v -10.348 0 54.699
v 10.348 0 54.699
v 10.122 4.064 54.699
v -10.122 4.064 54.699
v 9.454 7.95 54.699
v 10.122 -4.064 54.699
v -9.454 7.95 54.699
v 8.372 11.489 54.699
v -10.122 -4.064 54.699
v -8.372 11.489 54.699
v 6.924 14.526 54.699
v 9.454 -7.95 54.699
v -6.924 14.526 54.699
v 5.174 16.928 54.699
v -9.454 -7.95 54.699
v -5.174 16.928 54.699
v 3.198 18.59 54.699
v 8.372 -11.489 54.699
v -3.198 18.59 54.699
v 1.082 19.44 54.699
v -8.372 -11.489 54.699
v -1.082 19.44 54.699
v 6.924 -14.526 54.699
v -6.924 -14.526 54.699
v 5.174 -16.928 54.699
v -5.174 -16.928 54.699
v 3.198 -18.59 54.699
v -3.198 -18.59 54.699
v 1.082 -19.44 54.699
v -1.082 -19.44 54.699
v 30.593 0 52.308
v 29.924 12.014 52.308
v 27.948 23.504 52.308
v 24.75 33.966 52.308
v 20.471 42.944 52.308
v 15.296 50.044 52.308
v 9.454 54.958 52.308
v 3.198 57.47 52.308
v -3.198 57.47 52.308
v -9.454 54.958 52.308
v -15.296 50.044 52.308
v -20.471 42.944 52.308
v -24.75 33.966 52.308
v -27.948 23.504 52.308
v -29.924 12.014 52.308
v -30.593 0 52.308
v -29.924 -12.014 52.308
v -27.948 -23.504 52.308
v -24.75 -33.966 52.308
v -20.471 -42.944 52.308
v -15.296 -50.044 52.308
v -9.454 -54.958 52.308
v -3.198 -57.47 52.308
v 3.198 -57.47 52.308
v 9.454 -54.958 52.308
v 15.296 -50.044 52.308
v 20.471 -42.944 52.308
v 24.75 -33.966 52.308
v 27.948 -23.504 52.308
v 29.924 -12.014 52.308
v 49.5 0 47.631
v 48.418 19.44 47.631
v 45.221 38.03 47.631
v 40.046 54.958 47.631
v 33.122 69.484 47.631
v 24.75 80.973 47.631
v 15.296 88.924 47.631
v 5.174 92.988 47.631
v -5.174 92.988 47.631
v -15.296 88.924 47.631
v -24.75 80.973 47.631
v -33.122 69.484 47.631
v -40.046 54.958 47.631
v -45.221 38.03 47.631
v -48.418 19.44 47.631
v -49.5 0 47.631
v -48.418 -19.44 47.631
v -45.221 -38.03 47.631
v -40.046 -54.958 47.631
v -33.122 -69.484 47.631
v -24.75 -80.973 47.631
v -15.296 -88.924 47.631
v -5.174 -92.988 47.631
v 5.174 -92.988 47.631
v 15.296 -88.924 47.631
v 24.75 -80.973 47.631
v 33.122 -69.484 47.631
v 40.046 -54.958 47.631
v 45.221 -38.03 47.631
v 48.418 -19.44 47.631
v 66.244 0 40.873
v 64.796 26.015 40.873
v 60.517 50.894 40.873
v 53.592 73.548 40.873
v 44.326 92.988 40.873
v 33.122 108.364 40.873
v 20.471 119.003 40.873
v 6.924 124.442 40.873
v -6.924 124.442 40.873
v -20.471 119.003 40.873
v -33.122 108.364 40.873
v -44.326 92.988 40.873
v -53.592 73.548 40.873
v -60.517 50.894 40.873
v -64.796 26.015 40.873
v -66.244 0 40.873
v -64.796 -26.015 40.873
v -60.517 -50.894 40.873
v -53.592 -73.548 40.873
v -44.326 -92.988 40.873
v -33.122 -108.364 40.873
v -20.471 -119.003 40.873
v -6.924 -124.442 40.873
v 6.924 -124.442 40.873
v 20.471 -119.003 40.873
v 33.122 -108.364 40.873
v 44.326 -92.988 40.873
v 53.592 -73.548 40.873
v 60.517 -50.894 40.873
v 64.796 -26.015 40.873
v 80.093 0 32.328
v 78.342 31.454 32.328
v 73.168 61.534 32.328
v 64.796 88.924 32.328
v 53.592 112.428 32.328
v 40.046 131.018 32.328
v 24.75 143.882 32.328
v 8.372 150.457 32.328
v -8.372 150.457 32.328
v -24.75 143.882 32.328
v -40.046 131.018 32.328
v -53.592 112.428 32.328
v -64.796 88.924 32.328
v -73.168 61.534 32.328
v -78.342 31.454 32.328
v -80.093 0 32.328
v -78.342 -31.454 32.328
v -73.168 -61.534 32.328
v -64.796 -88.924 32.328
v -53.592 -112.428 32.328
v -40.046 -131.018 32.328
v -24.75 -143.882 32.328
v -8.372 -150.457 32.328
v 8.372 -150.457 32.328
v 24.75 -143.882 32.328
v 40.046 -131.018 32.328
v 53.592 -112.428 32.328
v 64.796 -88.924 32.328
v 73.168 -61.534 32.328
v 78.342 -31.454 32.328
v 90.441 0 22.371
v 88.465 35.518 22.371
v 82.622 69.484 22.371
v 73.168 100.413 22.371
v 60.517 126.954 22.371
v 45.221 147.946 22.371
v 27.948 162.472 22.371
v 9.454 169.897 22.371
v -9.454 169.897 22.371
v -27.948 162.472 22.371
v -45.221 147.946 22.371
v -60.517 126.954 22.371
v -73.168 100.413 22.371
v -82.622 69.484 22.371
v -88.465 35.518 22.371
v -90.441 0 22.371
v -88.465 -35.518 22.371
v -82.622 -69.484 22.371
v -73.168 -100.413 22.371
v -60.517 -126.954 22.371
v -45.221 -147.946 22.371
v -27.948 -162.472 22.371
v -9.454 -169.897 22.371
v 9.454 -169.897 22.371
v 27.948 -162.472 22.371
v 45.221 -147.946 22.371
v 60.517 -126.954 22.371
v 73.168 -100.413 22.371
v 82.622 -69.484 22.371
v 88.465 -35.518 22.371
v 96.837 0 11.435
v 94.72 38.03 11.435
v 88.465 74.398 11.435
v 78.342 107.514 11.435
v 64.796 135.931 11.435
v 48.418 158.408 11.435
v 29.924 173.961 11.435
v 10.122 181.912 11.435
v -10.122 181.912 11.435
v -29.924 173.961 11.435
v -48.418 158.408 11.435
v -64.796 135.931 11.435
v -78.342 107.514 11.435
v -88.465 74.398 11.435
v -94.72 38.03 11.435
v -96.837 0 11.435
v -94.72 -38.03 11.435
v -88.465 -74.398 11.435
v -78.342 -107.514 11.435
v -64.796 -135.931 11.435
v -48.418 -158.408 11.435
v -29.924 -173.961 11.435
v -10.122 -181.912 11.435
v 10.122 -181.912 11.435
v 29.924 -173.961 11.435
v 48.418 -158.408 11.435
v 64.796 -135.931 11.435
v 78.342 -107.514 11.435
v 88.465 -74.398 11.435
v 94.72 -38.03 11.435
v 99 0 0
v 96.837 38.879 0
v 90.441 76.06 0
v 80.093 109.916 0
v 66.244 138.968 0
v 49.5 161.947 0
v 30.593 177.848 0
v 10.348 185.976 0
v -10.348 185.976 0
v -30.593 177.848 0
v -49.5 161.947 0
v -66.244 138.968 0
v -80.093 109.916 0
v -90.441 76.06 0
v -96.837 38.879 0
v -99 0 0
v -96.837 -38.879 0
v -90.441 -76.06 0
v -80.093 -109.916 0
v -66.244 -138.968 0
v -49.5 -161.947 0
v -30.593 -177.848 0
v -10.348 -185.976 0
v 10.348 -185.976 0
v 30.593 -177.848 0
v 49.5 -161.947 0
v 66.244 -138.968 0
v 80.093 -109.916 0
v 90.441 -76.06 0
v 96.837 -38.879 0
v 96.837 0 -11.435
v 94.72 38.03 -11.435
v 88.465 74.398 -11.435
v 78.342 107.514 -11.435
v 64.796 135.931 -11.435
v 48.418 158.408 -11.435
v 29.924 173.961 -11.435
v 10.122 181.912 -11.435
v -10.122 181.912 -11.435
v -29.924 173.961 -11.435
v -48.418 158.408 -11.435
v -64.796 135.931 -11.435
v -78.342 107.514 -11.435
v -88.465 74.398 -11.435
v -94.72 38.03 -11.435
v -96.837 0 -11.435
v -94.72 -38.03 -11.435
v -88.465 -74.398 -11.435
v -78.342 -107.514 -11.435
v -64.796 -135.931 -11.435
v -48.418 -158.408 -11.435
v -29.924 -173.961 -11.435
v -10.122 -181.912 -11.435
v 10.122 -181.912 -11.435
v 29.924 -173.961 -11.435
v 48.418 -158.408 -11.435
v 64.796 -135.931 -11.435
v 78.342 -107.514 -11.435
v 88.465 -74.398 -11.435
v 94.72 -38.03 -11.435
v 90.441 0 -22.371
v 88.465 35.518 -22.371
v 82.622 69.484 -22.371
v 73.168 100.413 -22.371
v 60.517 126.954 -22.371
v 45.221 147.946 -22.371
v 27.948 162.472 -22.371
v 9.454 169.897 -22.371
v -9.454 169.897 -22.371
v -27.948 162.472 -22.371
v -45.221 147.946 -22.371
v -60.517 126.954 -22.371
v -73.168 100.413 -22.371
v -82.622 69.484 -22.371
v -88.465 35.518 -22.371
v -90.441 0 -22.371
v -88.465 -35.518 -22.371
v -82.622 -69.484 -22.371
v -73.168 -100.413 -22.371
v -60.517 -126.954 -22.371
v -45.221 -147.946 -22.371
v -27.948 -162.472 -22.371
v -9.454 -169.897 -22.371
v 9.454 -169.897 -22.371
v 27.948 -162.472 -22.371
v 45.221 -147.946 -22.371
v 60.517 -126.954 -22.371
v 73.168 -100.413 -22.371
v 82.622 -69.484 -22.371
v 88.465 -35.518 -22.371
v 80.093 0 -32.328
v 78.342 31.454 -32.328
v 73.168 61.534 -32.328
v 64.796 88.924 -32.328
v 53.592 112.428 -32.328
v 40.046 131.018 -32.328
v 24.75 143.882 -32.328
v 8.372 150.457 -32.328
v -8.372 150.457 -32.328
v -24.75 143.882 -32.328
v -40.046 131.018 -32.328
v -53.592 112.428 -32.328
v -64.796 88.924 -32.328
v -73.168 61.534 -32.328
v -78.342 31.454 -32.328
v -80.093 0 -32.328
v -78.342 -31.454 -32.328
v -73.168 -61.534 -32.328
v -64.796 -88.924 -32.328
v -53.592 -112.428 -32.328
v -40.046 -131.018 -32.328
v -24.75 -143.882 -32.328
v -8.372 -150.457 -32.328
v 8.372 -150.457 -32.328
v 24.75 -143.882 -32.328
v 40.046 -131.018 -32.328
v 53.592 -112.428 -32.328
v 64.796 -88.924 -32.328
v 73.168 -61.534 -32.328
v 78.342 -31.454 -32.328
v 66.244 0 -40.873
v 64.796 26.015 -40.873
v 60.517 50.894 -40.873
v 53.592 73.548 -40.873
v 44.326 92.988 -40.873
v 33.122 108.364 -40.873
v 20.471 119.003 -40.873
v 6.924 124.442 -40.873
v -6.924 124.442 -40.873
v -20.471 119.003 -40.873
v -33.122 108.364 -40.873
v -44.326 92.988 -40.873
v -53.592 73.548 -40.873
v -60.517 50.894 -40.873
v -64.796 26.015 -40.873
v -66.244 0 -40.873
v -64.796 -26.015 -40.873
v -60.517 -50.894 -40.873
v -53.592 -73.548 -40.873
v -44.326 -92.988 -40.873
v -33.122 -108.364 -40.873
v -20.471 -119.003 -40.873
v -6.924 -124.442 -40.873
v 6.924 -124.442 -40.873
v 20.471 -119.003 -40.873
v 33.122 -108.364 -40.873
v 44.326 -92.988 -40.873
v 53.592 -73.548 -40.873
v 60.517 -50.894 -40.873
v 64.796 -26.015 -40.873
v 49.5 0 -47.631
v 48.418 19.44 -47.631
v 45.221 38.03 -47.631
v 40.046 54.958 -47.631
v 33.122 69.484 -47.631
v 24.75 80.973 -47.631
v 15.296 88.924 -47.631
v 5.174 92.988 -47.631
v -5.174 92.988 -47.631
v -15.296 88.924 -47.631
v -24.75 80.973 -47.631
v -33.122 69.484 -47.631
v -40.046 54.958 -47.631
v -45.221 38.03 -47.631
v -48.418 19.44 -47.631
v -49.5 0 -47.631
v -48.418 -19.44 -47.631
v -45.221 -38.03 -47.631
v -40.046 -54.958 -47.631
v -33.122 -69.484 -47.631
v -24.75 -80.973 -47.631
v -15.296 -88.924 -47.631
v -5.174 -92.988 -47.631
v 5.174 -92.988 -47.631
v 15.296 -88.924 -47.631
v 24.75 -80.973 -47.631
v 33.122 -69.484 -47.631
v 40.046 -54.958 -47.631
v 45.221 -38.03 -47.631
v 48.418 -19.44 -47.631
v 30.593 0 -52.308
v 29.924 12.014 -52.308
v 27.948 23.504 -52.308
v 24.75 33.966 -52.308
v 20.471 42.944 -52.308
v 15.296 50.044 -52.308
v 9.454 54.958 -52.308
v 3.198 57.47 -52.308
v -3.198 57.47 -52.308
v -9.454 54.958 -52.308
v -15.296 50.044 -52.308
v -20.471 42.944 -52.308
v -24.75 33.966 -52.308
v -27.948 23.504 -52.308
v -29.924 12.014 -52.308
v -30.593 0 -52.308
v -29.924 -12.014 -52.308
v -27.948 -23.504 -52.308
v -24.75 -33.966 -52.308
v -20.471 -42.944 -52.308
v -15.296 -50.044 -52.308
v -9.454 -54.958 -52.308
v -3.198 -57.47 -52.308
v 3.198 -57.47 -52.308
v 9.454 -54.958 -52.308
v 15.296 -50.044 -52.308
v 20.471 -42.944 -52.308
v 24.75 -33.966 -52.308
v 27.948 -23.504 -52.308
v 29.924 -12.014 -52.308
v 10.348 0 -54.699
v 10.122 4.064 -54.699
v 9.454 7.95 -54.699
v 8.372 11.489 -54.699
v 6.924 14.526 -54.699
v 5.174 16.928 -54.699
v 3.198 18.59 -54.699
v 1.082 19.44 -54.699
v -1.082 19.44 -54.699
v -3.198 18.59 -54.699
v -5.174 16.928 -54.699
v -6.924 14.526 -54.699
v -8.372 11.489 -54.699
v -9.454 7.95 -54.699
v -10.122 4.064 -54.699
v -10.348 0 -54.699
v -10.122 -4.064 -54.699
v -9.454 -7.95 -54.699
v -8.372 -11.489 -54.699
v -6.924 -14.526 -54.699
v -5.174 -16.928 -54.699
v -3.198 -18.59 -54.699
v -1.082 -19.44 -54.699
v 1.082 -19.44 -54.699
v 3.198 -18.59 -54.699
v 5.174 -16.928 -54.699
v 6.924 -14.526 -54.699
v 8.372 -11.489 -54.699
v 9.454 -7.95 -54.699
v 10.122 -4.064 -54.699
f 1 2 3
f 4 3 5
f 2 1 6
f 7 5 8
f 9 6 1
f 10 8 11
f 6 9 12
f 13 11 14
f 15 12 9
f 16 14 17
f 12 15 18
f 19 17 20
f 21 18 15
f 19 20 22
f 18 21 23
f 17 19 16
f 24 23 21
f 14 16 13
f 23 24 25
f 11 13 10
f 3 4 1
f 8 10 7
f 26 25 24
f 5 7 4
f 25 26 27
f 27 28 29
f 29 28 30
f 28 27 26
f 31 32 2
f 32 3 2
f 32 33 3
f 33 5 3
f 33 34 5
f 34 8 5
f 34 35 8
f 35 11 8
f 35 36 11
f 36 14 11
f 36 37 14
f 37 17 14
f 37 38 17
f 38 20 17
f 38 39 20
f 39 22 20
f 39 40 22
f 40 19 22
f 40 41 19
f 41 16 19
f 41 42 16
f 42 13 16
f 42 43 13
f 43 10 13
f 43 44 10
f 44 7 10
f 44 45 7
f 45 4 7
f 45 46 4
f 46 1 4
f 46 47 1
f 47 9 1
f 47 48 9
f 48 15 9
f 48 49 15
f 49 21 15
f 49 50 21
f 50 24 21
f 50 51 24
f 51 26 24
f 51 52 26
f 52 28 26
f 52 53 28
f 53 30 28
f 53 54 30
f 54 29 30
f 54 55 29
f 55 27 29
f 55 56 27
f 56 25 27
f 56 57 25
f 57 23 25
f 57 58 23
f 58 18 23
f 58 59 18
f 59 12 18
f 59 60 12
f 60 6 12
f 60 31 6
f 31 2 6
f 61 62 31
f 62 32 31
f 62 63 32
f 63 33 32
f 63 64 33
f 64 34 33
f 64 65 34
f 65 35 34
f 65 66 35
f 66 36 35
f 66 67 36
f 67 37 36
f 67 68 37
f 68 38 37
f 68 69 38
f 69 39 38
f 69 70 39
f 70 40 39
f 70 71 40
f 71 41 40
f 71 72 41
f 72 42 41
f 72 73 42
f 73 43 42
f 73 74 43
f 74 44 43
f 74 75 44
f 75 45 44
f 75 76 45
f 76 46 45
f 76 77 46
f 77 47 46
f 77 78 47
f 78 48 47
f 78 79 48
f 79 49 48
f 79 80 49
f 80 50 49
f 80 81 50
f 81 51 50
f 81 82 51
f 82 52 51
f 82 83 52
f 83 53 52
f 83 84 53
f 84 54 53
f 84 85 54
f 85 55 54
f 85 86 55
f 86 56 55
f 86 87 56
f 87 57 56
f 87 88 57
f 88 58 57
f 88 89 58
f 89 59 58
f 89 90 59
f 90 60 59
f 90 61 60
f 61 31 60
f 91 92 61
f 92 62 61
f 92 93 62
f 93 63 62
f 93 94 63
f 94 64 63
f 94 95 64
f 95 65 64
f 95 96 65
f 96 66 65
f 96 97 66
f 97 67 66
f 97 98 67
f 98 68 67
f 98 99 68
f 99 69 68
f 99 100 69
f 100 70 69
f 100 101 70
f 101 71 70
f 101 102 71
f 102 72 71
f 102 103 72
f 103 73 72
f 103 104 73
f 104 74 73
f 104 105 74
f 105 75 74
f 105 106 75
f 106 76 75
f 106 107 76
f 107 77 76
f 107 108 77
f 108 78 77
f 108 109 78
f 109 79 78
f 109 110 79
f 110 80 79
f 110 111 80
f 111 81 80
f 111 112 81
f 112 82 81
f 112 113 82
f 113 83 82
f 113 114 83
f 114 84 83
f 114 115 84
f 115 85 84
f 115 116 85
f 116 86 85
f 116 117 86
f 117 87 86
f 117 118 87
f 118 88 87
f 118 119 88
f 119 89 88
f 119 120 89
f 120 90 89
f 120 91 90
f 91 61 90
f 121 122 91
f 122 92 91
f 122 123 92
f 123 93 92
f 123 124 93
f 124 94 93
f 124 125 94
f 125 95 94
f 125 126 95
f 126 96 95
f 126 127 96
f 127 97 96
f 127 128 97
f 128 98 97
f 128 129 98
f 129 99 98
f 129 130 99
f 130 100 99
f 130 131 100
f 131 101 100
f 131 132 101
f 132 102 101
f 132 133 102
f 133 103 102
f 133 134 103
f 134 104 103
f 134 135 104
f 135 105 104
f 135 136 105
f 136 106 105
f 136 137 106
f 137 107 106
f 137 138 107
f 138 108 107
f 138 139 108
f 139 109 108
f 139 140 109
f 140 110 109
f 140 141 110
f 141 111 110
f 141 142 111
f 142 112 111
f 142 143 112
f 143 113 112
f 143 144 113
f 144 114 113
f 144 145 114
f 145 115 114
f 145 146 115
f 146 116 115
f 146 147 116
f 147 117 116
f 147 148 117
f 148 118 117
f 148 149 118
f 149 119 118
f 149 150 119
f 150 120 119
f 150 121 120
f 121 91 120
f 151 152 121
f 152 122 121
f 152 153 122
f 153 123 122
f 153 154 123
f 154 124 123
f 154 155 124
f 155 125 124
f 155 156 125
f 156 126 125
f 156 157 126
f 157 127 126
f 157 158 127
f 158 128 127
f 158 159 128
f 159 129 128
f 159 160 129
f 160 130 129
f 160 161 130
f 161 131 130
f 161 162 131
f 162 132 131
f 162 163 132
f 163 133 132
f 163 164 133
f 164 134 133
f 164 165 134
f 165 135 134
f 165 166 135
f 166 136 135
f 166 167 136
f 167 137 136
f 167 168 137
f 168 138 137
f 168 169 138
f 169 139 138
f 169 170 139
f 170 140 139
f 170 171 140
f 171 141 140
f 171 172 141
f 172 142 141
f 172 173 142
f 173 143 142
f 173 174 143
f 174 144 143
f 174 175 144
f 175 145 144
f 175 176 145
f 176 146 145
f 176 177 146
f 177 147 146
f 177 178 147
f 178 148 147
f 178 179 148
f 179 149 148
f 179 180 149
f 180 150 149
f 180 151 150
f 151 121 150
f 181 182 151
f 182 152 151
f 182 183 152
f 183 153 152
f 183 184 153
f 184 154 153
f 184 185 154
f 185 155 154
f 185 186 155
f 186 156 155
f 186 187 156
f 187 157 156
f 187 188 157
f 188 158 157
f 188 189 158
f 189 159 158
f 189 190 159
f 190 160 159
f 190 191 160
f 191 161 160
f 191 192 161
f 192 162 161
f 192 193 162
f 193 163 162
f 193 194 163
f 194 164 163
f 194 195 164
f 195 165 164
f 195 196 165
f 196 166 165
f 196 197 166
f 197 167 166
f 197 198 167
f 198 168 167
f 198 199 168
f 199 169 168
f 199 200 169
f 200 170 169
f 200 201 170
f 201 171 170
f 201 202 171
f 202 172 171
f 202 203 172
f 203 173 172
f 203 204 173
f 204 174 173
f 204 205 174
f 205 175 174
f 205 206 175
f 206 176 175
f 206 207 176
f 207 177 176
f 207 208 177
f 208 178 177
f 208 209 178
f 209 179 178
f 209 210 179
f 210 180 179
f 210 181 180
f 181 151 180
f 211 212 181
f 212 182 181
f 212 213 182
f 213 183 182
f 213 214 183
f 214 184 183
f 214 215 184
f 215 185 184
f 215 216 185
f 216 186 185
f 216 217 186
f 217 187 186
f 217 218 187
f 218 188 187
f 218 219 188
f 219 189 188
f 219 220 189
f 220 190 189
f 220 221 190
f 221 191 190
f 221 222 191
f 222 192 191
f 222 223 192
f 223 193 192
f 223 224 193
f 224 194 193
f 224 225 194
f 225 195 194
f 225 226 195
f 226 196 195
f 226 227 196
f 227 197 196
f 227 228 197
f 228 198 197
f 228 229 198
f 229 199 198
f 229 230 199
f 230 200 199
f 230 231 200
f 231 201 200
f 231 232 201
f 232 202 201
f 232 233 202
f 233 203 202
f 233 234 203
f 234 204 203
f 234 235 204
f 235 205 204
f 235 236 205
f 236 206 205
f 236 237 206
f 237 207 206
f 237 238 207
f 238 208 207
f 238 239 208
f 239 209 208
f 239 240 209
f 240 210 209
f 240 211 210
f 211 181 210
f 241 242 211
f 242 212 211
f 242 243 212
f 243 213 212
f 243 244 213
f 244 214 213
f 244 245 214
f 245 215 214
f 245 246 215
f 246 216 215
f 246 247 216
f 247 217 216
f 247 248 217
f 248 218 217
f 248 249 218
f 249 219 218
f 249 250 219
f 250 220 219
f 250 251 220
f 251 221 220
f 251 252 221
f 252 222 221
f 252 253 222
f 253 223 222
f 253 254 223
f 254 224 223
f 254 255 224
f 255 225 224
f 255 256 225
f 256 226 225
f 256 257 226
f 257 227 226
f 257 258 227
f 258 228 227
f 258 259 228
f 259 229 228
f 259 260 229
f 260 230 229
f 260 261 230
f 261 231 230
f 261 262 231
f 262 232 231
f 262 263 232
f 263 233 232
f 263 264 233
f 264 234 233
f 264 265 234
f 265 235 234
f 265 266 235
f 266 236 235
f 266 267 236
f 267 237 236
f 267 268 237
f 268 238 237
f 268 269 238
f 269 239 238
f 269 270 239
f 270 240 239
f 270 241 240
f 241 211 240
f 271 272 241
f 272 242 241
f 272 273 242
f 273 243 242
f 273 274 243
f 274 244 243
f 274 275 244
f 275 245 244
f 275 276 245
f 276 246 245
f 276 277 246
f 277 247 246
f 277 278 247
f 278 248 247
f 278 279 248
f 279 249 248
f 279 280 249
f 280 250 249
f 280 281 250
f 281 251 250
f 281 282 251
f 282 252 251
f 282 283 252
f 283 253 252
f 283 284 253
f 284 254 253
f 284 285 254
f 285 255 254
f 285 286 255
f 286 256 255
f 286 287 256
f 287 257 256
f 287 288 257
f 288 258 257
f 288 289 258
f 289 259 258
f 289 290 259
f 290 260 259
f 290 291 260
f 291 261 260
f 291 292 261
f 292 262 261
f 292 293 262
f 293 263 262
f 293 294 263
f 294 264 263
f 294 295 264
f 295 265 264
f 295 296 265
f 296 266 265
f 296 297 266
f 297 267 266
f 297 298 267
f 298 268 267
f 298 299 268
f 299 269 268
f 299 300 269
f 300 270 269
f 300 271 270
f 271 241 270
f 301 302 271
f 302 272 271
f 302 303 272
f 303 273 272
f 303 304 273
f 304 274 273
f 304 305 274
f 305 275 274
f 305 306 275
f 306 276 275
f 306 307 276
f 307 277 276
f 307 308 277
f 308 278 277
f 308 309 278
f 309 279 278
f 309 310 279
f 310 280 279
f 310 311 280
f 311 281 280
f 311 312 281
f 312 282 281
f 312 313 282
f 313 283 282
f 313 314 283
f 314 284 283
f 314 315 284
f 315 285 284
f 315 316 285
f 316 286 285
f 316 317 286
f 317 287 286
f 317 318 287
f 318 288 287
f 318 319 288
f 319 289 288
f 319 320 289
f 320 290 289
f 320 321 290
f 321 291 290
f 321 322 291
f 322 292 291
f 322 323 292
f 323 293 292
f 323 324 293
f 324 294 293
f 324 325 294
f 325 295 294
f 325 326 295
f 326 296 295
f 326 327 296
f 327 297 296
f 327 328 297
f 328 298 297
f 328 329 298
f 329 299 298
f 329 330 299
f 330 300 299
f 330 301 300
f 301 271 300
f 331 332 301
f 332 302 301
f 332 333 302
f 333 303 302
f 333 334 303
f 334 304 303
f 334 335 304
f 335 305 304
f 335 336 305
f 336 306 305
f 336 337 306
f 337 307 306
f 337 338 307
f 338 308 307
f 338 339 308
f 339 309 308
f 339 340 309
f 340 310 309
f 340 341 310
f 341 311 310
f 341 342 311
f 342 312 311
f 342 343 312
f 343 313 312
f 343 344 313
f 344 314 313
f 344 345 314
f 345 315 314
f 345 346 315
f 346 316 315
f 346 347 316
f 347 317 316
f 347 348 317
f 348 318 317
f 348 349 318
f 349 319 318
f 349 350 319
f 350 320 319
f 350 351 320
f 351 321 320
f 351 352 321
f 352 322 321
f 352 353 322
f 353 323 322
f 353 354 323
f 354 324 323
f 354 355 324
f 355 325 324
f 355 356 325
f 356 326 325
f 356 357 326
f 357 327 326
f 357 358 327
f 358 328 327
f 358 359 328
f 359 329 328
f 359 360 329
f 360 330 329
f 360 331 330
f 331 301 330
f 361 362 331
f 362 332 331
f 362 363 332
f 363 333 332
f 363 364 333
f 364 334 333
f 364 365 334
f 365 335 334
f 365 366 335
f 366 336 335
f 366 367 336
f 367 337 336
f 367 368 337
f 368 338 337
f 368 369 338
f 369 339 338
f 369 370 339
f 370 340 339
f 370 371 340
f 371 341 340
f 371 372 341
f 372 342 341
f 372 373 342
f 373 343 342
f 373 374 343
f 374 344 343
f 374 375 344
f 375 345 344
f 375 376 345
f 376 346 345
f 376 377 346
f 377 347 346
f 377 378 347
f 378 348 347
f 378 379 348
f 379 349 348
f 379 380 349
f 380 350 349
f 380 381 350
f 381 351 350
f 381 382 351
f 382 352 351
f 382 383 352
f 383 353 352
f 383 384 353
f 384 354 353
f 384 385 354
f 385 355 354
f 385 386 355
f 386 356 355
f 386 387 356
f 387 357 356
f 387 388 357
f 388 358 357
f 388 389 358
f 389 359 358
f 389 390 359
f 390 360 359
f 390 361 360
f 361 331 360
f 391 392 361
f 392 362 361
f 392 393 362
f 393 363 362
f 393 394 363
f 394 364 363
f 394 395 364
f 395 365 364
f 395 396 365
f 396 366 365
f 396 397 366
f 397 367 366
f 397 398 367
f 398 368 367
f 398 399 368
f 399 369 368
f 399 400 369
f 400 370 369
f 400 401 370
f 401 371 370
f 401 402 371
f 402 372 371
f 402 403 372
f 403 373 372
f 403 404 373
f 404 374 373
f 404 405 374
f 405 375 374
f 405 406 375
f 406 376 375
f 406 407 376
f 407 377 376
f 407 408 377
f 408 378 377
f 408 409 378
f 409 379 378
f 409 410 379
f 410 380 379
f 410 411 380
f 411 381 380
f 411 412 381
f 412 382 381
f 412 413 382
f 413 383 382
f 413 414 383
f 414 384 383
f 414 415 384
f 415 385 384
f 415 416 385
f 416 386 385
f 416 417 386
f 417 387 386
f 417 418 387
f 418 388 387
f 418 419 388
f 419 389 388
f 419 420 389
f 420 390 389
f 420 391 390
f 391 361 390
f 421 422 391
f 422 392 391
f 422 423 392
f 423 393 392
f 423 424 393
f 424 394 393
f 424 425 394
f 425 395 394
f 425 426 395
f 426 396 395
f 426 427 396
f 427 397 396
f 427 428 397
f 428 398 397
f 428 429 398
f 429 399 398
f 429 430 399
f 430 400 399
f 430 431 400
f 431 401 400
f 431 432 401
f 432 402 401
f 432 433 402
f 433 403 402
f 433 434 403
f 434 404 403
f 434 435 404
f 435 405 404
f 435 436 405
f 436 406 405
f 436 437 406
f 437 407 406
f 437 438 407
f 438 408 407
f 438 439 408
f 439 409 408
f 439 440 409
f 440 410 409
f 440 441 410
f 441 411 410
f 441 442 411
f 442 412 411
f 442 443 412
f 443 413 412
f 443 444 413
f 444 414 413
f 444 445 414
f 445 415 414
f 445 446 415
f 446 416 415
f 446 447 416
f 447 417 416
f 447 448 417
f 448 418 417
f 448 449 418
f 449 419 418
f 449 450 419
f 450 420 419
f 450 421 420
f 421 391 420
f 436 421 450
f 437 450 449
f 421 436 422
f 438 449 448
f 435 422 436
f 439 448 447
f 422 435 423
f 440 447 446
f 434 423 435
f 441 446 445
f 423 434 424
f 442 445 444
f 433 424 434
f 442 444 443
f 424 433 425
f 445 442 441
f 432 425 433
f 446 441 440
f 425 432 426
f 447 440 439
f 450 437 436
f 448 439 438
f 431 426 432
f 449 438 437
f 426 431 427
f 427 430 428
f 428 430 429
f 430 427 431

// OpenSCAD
// Generated by SolidPython 1.0.1 on 2020-07-29 00:46:49


scale(v = [9, 17, 5]) {
	sphere(r = 11);
}
/***********************************************
*********      SolidPython code:      **********
************************************************
 
# import packages: SolidPython
from solid import *
from solid.utils import *
from itertools import chain, combinations, permutations


class Resize:

    def __init__(self, scad_file):
        self.scad_file = scad_file
        #self.scad_file = import_scad(scad_file)
        # cone/cylinder param:
        self.r1 = 0
        self.r2 = 0
        self.h = 0
        # rectangular prism param:
        self.w = 0
        self.l = 0
        # ellipse param:
        self.r = 0

    # import OpenScad code (file name corresponds to shape)


    # classify shape + parameters
    def assign(self, param1, param2, param3):
        if self.scad_file == 'cone.scad':
            self.r1 = param1
            self.r2 = param2
            self.h = param3
        elif self.scad_file == 'cylinder.scad':
            self.r1 = param1
            self.r2 = param2
            self.h = param3
        elif self.scad_file == 'rectangularPrism.scad':
            self.h = param1
            self.l = param2
            self.w = param3
        else:
            self.r = param1
            self.h = param2

    # resize parameters
    def iterate(self):
        x = range(3, 20, 2)
        i = 1
        if self.scad_file == 'cone.scad':
            tempList = list(permutations(x, 2))
            for temp in tempList:
                param1 = temp[0]
                param2 = temp[1]
                filepath = 'produced_scad_files/' + 'cone' + str(param1) + '_' + str(param2) + '_' + '.scad'
                scad_render_to_file(cylinder(h=param1, r1=param2, r2=0), filepath)

        elif self.scad_file == 'cylinder.scad':
            tempList = list(permutations(x, 3))
            for temp in tempList:
                param1 = temp[0]
                param2 = temp[1]
                filepath = 'produced_scad_files/' + 'cylinder' + str(param1) + '_' + str(param2) + '_' + '.scad'
                scad_render_to_file(cylinder(h=param1, r1=param2, r2=param2), filepath)

        elif self.scad_file == 'rectangularPrism.scad':
            tempList = list(permutations(x, 3))
            for temp in tempList:
                param1 = temp[0]
                param2 = temp[1]
                param3 = temp[2]
                filepath = 'produced_scad_files/' + 'rectangularPrism' + str(param1) + '_' + str(param2) + '_' + str(
                    param3) + '.scad'
                scad_render_to_file(cube(size=(param1, param2, param3)), filepath)

        elif self.scad_file == 'ellipse.scad':
            tempList = list(permutations(x, 4))
            for temp in tempList:
                param1 = temp[0]
                param2 = temp[1]
                param3 = temp[2]
                param4 = temp[3]
                filepath = 'produced_scad_files/' + 'ellipse' + str(param1) + '_' + str(param2) + '_' + str(param3) + '_' + str(param4) + '.scad'
                scad_render_to_file(scale([param1, param2, param3])(sphere(r=param4)), filepath)

    def render_to_scadfile(self):
        scad_render_to_file(scad, 'example.scad') 
 
************************************************/
